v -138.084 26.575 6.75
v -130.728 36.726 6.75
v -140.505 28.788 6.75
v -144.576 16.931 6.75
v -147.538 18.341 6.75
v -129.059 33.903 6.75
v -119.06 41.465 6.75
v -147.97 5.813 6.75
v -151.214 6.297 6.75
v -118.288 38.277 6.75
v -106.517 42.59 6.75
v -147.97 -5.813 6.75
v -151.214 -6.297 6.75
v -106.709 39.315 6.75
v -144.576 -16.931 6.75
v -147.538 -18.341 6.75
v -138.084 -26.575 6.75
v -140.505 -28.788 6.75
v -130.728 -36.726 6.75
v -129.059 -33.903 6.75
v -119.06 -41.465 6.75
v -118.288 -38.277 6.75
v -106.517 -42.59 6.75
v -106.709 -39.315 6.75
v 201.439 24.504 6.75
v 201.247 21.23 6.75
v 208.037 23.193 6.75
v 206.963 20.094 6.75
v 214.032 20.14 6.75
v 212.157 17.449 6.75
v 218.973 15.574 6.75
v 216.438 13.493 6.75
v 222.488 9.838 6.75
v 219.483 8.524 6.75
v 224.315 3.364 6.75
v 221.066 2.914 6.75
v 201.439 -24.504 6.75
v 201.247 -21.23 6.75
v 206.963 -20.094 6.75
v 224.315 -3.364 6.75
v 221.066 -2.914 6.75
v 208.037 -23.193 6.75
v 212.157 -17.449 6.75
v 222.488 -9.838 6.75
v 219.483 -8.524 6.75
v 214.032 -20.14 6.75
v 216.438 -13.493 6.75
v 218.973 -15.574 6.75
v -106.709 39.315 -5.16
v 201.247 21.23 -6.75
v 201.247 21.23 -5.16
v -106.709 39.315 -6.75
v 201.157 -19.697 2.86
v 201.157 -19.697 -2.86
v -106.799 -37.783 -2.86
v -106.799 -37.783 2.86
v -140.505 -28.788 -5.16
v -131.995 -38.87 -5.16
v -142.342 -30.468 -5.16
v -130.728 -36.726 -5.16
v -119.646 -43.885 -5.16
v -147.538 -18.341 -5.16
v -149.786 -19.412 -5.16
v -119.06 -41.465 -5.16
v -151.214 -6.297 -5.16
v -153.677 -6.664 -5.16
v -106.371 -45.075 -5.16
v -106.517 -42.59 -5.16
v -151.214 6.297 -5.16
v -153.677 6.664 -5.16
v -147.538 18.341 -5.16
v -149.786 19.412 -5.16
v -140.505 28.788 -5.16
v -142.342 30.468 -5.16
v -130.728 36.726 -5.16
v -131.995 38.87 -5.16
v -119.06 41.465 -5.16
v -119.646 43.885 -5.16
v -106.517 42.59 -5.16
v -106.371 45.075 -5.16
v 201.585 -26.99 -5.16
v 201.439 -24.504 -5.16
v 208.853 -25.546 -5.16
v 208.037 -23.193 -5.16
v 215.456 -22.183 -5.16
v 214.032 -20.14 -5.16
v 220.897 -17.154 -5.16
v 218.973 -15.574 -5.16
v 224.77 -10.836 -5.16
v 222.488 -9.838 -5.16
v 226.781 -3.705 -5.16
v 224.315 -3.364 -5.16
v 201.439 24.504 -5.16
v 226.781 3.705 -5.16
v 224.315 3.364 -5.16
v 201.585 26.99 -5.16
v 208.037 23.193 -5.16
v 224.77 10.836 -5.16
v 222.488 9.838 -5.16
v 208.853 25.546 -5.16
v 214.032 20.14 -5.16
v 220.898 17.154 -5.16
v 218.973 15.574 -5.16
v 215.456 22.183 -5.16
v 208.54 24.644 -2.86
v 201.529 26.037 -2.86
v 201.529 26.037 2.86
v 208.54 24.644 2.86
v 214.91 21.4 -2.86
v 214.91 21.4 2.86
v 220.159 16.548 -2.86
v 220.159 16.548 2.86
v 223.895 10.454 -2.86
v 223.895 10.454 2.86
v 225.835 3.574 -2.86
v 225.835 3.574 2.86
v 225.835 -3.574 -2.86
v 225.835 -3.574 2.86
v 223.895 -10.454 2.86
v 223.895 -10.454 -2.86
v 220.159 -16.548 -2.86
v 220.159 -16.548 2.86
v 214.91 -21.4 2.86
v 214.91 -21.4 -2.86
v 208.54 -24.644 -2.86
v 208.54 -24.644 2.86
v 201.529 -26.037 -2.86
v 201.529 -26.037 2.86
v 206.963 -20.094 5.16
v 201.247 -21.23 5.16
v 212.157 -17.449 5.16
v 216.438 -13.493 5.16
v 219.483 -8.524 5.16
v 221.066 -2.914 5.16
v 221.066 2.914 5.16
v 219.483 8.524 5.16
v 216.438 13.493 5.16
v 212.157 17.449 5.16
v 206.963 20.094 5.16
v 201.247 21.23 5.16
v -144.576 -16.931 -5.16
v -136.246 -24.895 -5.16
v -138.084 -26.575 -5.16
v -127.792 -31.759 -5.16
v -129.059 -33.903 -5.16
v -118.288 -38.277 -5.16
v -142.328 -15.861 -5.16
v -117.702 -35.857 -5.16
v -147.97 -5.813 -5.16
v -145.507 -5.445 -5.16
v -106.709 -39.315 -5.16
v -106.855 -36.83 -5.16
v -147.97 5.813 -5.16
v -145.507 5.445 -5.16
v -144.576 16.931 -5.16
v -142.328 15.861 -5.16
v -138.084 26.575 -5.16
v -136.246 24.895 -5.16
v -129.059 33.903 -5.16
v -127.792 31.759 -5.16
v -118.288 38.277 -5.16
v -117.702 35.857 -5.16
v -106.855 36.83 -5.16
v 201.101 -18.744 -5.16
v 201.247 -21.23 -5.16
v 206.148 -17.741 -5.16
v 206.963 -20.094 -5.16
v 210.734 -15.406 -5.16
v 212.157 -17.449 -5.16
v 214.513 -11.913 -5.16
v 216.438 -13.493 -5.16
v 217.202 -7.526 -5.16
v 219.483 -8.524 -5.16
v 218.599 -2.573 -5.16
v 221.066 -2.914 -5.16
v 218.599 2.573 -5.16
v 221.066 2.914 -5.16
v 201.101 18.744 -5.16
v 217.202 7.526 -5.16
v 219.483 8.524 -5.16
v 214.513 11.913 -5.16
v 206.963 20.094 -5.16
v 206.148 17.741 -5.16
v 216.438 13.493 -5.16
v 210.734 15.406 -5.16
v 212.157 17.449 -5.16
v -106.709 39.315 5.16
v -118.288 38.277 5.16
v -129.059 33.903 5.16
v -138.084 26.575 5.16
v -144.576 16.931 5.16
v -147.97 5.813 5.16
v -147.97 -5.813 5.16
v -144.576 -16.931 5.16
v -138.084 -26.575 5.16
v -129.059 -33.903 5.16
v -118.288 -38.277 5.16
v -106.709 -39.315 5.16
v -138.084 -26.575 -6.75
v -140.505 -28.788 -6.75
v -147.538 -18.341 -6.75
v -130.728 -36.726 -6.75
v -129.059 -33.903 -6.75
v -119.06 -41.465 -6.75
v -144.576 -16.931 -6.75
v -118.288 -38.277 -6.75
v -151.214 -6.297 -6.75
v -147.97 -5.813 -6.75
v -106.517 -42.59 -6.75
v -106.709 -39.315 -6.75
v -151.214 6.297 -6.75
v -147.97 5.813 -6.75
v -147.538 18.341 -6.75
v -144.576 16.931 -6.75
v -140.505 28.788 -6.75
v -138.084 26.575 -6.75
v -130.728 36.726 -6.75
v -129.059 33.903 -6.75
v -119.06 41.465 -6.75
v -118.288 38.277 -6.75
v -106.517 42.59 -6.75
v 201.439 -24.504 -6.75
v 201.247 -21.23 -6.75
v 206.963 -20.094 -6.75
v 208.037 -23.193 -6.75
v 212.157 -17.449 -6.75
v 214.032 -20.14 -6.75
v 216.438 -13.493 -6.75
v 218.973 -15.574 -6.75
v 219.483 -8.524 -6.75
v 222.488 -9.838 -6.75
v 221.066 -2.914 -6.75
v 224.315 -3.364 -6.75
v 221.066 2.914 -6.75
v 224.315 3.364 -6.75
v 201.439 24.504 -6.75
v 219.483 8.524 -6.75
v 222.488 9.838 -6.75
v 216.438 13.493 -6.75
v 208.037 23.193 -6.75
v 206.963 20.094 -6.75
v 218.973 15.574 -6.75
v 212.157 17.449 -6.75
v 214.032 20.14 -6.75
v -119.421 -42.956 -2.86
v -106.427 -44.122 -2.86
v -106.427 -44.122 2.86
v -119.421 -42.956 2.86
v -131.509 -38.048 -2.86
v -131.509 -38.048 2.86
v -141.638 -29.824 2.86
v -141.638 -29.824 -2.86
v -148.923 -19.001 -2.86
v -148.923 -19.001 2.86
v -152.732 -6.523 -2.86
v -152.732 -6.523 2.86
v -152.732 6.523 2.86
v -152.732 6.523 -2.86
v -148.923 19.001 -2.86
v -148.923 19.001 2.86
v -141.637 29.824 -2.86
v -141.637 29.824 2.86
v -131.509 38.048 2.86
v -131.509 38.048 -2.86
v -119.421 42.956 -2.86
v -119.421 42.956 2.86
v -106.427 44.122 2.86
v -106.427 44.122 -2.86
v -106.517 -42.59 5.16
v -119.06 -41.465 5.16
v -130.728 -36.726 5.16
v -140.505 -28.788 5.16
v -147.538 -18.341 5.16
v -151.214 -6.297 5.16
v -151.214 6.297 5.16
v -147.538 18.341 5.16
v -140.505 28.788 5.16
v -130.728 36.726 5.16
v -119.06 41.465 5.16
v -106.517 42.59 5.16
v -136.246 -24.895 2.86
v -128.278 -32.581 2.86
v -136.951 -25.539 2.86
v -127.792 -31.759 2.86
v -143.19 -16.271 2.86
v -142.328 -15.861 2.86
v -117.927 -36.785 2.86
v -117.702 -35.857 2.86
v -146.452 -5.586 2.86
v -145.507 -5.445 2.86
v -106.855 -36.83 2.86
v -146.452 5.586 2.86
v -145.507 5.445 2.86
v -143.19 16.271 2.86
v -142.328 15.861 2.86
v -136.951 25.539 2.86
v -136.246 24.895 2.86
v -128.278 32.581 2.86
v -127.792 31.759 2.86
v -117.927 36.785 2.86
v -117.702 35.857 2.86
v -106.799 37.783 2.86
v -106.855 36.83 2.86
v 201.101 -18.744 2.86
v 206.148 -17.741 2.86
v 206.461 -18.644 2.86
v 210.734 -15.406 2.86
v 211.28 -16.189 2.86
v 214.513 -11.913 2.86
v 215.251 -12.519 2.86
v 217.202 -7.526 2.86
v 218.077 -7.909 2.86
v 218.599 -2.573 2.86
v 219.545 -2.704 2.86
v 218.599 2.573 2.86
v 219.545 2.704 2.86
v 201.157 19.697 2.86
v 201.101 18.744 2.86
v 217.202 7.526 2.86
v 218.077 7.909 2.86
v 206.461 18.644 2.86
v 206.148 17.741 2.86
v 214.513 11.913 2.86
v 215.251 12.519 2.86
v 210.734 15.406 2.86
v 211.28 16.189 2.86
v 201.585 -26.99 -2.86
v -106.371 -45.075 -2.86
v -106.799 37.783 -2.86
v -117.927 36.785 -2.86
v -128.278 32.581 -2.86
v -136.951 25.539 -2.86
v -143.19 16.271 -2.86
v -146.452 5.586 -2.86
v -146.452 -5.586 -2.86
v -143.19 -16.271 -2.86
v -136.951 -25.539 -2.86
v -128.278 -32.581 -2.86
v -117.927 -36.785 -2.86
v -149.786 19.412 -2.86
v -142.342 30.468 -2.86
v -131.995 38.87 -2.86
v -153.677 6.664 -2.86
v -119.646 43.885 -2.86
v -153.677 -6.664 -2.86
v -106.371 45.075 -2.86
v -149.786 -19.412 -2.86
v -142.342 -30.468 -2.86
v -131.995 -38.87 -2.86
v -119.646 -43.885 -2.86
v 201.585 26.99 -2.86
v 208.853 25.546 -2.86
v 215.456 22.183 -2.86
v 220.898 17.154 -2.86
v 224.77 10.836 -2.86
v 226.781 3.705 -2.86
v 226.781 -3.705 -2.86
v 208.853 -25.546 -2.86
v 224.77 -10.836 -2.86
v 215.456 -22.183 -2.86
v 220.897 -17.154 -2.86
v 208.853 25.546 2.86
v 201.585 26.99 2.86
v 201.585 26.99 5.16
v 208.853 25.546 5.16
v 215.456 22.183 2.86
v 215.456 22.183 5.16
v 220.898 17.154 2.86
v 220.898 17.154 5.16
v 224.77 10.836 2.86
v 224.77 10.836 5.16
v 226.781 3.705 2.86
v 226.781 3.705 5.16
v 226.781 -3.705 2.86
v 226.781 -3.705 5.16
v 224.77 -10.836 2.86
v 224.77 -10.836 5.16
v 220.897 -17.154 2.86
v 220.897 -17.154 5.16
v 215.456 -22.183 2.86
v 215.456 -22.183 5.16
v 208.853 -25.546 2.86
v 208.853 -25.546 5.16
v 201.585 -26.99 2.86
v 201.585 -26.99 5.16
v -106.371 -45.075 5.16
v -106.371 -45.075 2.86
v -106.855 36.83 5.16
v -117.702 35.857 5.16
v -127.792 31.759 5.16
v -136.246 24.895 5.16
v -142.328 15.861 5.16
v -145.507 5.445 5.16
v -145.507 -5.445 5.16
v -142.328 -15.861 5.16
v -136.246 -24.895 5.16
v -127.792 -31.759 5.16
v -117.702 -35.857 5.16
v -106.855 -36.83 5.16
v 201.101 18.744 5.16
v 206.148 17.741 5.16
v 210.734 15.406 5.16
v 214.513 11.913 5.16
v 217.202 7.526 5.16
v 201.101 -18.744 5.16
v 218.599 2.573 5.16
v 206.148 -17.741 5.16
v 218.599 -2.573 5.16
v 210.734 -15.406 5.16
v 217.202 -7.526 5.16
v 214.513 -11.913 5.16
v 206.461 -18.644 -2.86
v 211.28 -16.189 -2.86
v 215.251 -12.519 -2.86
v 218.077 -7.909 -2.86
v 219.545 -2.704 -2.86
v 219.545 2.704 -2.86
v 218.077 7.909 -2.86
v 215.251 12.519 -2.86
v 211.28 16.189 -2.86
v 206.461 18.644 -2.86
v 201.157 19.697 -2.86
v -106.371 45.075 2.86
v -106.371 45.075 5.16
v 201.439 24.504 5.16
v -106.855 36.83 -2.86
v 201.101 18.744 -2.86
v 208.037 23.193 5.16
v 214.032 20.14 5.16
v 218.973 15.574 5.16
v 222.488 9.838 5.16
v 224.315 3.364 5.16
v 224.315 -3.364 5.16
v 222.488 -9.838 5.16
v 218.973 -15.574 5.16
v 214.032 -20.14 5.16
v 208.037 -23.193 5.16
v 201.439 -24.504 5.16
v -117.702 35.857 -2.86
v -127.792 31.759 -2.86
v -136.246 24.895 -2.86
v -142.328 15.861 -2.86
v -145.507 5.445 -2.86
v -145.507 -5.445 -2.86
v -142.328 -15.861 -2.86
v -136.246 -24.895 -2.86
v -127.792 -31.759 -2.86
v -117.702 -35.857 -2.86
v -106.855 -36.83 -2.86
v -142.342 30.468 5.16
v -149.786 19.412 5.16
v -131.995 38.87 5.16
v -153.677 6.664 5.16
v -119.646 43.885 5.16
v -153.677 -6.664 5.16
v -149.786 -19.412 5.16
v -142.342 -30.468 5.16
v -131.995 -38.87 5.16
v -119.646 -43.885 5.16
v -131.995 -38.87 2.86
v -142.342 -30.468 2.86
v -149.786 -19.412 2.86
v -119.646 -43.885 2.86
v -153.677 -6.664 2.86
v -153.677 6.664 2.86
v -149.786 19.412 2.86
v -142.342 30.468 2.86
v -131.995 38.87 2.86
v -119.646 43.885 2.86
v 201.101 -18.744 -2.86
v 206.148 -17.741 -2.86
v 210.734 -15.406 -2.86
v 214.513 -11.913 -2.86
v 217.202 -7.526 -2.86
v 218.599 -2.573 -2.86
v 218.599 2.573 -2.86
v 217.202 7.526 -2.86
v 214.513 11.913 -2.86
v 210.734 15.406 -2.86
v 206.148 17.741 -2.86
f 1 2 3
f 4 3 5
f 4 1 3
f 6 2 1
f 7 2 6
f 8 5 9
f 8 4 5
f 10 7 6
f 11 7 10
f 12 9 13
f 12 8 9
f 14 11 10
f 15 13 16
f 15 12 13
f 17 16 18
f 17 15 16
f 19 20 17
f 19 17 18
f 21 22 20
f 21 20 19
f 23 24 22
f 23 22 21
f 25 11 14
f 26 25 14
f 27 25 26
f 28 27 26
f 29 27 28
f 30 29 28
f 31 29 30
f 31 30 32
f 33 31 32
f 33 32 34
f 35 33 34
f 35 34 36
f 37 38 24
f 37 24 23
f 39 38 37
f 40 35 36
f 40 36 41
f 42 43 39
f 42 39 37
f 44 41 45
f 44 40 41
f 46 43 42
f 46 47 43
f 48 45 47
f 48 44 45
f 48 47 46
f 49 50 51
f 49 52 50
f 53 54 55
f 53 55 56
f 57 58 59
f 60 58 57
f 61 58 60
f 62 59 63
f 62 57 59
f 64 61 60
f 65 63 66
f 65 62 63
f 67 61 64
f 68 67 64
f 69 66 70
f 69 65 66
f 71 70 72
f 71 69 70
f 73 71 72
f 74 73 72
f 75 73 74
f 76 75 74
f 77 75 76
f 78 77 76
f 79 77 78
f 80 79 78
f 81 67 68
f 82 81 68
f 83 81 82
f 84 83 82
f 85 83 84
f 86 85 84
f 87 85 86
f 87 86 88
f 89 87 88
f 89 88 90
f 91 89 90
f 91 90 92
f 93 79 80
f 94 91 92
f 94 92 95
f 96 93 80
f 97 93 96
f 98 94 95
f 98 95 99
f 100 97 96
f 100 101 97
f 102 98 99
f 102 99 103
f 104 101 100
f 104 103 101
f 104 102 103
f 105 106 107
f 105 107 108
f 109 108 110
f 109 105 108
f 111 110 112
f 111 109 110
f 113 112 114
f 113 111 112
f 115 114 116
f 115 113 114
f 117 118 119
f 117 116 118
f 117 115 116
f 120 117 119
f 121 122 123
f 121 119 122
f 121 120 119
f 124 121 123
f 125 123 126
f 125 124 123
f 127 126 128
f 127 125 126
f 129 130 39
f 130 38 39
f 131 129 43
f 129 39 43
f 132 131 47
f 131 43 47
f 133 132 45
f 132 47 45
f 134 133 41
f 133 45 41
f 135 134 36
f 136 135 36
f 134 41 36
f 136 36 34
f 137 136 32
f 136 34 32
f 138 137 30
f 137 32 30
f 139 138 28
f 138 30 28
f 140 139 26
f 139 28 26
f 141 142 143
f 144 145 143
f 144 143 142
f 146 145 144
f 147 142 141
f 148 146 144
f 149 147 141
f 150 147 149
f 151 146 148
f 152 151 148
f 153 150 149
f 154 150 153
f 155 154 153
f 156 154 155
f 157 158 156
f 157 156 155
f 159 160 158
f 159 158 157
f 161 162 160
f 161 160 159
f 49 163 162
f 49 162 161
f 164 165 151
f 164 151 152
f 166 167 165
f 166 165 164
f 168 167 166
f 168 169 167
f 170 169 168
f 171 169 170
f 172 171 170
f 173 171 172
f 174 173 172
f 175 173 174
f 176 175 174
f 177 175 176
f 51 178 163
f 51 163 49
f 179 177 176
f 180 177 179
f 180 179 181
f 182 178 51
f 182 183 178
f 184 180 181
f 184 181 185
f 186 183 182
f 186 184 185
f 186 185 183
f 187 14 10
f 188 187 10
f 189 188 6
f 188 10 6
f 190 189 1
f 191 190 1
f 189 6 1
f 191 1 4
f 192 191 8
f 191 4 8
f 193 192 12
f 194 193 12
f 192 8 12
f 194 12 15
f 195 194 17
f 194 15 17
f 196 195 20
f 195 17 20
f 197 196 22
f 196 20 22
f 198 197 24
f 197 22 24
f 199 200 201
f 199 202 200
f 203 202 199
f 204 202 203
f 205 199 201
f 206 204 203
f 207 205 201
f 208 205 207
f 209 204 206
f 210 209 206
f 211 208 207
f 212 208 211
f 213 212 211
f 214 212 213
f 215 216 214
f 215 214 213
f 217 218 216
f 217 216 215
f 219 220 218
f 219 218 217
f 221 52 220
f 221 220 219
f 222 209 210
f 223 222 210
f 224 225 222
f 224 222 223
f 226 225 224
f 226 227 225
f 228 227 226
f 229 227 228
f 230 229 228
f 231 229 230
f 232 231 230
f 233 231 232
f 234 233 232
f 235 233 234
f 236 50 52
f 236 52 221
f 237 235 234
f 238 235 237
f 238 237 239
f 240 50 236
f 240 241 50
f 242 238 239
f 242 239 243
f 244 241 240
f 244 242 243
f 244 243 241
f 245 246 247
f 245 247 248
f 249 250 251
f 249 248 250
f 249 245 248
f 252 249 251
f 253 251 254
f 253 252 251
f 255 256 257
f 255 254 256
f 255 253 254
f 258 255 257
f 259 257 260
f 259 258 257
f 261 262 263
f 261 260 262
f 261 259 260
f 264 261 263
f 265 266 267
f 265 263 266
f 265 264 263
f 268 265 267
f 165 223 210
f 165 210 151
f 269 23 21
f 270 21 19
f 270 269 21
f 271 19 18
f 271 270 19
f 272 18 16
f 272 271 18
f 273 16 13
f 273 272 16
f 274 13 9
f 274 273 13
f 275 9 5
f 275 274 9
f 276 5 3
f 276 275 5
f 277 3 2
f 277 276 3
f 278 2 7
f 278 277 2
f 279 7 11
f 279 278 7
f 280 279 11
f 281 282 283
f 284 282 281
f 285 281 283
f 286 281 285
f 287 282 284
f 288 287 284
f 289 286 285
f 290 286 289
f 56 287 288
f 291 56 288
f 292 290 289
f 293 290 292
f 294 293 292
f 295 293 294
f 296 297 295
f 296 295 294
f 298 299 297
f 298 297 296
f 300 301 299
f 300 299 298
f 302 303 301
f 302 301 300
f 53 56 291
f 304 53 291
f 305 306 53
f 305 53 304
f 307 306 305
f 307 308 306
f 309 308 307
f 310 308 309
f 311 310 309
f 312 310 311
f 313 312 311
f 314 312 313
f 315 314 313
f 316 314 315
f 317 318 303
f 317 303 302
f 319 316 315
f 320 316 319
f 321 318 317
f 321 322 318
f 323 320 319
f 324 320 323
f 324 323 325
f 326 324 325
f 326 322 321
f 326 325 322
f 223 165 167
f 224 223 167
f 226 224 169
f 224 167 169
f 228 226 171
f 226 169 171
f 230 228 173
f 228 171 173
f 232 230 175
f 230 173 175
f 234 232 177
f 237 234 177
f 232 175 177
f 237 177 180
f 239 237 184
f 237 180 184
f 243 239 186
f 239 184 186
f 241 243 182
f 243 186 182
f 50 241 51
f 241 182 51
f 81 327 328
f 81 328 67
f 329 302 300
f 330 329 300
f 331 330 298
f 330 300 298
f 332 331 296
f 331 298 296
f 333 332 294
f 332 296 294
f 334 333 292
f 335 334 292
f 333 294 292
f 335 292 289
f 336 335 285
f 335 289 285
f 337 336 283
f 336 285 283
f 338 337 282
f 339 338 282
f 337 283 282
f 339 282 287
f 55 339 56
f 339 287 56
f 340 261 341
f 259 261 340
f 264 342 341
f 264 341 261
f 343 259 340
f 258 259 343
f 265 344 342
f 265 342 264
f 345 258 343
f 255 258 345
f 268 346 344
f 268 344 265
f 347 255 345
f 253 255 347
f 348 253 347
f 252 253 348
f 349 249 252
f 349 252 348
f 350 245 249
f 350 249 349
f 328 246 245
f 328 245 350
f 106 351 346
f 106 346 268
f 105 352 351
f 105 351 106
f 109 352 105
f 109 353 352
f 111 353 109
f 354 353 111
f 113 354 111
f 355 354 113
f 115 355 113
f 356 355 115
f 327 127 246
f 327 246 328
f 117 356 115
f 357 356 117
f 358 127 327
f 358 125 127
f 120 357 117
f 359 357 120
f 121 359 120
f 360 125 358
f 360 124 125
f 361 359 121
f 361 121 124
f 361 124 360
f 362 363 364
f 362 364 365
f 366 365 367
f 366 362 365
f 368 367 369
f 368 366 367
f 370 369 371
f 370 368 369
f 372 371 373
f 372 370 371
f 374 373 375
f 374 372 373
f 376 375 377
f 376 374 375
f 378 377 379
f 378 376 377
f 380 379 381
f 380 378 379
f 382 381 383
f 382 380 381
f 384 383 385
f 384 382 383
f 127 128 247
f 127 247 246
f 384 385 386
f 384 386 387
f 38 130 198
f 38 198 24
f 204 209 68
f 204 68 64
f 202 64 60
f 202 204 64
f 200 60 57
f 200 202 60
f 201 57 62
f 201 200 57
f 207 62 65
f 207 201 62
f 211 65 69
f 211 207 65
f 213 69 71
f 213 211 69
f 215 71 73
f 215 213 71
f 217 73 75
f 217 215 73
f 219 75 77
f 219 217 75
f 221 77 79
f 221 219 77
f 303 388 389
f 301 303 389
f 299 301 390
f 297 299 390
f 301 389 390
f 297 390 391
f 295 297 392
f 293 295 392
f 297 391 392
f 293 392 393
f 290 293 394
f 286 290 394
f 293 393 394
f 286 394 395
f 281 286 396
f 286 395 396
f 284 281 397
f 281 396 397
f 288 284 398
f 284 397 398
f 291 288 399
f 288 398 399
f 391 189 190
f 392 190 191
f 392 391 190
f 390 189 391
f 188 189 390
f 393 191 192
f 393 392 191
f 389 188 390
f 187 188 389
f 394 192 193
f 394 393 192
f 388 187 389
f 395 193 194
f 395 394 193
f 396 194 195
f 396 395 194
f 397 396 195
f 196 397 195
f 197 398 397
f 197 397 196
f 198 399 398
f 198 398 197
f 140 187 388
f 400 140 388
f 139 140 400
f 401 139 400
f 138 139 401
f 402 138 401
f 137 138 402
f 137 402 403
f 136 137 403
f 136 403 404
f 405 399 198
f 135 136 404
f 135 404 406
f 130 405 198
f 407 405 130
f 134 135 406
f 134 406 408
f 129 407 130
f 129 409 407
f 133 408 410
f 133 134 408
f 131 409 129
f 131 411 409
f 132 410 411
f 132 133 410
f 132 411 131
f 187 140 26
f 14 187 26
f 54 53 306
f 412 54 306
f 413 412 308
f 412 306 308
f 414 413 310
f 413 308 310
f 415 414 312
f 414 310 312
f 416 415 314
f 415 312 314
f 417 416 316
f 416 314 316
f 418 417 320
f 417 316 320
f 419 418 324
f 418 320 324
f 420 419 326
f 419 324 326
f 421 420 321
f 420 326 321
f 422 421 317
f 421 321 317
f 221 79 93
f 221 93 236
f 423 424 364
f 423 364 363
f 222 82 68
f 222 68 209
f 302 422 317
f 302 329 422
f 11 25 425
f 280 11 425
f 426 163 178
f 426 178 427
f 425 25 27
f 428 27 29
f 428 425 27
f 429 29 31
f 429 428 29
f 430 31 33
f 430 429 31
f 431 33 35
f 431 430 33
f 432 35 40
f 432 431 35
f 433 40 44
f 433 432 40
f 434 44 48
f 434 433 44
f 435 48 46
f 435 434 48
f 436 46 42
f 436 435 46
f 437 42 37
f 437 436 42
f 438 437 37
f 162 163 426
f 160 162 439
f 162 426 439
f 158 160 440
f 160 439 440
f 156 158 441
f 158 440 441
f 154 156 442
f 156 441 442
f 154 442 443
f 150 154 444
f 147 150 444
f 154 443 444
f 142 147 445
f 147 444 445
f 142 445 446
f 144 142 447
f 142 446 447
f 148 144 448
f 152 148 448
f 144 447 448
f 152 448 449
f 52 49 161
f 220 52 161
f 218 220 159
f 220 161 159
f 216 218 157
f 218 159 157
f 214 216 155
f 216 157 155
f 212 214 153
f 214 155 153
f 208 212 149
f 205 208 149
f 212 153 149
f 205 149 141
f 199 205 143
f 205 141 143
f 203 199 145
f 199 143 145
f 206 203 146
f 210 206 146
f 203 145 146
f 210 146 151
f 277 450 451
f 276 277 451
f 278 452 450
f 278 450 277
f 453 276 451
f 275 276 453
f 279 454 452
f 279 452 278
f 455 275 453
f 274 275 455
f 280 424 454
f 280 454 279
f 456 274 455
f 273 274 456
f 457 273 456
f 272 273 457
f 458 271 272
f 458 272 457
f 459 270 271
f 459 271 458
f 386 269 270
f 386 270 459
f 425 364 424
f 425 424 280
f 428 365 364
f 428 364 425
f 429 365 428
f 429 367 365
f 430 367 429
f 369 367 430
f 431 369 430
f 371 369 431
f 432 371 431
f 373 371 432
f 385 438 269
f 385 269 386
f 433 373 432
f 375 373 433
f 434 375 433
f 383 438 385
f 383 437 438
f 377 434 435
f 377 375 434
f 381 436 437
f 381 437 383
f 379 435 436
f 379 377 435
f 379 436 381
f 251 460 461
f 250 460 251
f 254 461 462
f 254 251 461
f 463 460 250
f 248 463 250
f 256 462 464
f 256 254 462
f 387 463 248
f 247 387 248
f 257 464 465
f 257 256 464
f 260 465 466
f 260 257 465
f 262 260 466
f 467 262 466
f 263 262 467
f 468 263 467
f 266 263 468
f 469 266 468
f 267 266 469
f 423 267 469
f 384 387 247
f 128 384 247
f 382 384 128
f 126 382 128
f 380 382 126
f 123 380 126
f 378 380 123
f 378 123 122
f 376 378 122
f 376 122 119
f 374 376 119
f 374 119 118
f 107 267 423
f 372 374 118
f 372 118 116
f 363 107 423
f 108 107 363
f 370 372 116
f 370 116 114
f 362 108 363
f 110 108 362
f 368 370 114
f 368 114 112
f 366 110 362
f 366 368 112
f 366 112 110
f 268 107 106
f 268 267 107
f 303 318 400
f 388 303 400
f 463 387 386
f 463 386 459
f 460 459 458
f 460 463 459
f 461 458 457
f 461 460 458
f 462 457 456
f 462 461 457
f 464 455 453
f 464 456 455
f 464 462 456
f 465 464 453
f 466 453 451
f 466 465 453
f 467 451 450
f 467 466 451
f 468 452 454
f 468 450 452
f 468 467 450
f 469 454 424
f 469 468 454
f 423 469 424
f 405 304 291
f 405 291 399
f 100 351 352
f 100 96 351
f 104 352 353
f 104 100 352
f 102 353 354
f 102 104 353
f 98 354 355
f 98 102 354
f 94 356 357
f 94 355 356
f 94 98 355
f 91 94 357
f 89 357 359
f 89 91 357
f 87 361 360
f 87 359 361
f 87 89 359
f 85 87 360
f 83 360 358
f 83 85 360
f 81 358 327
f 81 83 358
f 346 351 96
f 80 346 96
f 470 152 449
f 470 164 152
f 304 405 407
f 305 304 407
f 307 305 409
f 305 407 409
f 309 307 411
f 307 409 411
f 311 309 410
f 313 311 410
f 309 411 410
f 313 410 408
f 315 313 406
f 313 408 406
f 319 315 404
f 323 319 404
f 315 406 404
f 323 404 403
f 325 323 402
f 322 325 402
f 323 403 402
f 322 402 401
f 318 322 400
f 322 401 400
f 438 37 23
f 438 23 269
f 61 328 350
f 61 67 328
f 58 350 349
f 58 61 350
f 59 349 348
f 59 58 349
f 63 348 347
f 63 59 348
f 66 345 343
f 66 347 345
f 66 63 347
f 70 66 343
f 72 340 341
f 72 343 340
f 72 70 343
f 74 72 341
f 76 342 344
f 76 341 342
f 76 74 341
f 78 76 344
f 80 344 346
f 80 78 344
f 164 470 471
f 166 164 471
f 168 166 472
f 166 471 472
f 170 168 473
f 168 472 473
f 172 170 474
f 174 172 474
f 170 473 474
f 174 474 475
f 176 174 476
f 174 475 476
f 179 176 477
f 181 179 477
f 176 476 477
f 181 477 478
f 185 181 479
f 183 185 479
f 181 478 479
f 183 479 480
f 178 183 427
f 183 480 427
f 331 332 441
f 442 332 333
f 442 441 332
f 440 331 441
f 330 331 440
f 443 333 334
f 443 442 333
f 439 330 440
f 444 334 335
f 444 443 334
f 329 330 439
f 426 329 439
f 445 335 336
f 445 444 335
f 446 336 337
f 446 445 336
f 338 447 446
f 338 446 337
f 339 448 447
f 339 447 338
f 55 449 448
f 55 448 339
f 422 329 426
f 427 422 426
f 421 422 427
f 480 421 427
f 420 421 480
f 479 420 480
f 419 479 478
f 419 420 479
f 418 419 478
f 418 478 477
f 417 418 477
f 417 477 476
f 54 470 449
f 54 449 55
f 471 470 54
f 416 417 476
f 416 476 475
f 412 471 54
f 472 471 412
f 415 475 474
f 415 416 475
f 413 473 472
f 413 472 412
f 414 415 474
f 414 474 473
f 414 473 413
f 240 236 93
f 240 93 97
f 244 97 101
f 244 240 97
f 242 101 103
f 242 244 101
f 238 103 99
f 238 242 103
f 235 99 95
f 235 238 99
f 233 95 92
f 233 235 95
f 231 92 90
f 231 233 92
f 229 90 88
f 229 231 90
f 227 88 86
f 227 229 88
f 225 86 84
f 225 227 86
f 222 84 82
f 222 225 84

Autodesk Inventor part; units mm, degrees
ref_plane "Work Plane2" through (-109.0183, 0, 0) normal (-1, 0, 0) x (0, 0, 1)
ref_plane "Work Plane3" through (200, 0, 0) normal (-0.9782514, 0.2074228, 0) x (0, 0, 1)
sketch "Path" plane through (0, 0, 0) normal (0, 0, 1) x (1, 0, 0)
  arc A0 (-106.6132, 40.9526) -> (-106.6132, -40.9526) centre (-109.0183, 0) ccw
  arc A1 (201.3429, -22.867) -> (201.3429, 22.867) centre (200, 0) ccw
  line L0 (201.3429, -22.867) -> (-106.6132, -40.9526)
  line L1 (-106.6132, 40.9526) -> (201.3429, 22.867)
  dimension "d31" = 8.26
ref_plane "Section Plane" through (-106.6132, -40.9526, 0) normal (0.99828, 0.058627, 0) x (0, 0, 1)
sketch "Section Sketch" plane through (-106.6132, -40.9526, 0) normal (0.99828, 0.058627, 0) x (0, 0, 1)
  line L0 (-6.75, -1.64) -> (6.75, -1.64)
  line L1 (6.75, -1.64) -> (6.75, 1.64)
  line L2 (6.75, 1.64) -> (-6.75, 1.64)
  line L3 (-6.75, 1.64) -> (-6.75, -1.64)
  line L4 (-2.86, -3.175) -> (2.86, -3.175)
  line L5 (2.86, -3.175) -> (2.86, 3.175)
  line L6 (2.86, 3.175) -> (-2.86, 3.175)
  line L7 (-2.86, 3.175) -> (-2.86, -3.175)
  line L8 (-2.86, 0) -> (2.86, 0) construction
  line L9 (-5.16, -4.13) -> (-2.86, -4.13)
  line L10 (-2.86, -4.13) -> (-2.86, 4.13)
  line L11 (-2.86, 4.13) -> (-5.16, 4.13)
  line L12 (-5.16, 4.13) -> (-5.16, -4.13)
  line L13 (2.86, -4.13) -> (5.16, -4.13)
  line L14 (5.16, -4.13) -> (5.16, 4.13)
  line L15 (5.16, 4.13) -> (2.86, 4.13)
  line L16 (2.86, 4.13) -> (2.86, -4.13)
  line L17 (-6.75, 0) -> (6.75, 0) construction
  point P0 (0, 0)
  point P1 (0, 0)
  dimension "d21" = 3.28
  dimension "d22" = 6.35
  dimension "d23" = 5.72
  dimension "d24" = 2.3
  dimension "d31" = 8.26
  dimension "d32" = 13.5
sweep "Solid" add profiles "Section Sketch" path "Path"
pattern_of_one "Strand Pattern"
equation "\"d21\" = da_d2"
equation "\"d22\" = da_d1"
equation "\"d23\" = da_b1"
equation "\"d24\" = da_t1 + da_t2"
equation "\"d30\" = da_pt"
equation "\"da_p\" = 9.525"
equation "\"da_b1\" = 5.72"
equation "\"da_h2\" = 8.26"
equation "\"da_h3\" = 8.26"
equation "\"da_d1\" = 6.35"
equation "\"da_d2\" = 3.28"
equation "\"da_pt\" = 10.24"
equation "\"da_b\" = 13.5"
equation "\"da_t1\" = 1.3"
equation "\"da_t2\" = 1"
properties part number "Roller Chain"
